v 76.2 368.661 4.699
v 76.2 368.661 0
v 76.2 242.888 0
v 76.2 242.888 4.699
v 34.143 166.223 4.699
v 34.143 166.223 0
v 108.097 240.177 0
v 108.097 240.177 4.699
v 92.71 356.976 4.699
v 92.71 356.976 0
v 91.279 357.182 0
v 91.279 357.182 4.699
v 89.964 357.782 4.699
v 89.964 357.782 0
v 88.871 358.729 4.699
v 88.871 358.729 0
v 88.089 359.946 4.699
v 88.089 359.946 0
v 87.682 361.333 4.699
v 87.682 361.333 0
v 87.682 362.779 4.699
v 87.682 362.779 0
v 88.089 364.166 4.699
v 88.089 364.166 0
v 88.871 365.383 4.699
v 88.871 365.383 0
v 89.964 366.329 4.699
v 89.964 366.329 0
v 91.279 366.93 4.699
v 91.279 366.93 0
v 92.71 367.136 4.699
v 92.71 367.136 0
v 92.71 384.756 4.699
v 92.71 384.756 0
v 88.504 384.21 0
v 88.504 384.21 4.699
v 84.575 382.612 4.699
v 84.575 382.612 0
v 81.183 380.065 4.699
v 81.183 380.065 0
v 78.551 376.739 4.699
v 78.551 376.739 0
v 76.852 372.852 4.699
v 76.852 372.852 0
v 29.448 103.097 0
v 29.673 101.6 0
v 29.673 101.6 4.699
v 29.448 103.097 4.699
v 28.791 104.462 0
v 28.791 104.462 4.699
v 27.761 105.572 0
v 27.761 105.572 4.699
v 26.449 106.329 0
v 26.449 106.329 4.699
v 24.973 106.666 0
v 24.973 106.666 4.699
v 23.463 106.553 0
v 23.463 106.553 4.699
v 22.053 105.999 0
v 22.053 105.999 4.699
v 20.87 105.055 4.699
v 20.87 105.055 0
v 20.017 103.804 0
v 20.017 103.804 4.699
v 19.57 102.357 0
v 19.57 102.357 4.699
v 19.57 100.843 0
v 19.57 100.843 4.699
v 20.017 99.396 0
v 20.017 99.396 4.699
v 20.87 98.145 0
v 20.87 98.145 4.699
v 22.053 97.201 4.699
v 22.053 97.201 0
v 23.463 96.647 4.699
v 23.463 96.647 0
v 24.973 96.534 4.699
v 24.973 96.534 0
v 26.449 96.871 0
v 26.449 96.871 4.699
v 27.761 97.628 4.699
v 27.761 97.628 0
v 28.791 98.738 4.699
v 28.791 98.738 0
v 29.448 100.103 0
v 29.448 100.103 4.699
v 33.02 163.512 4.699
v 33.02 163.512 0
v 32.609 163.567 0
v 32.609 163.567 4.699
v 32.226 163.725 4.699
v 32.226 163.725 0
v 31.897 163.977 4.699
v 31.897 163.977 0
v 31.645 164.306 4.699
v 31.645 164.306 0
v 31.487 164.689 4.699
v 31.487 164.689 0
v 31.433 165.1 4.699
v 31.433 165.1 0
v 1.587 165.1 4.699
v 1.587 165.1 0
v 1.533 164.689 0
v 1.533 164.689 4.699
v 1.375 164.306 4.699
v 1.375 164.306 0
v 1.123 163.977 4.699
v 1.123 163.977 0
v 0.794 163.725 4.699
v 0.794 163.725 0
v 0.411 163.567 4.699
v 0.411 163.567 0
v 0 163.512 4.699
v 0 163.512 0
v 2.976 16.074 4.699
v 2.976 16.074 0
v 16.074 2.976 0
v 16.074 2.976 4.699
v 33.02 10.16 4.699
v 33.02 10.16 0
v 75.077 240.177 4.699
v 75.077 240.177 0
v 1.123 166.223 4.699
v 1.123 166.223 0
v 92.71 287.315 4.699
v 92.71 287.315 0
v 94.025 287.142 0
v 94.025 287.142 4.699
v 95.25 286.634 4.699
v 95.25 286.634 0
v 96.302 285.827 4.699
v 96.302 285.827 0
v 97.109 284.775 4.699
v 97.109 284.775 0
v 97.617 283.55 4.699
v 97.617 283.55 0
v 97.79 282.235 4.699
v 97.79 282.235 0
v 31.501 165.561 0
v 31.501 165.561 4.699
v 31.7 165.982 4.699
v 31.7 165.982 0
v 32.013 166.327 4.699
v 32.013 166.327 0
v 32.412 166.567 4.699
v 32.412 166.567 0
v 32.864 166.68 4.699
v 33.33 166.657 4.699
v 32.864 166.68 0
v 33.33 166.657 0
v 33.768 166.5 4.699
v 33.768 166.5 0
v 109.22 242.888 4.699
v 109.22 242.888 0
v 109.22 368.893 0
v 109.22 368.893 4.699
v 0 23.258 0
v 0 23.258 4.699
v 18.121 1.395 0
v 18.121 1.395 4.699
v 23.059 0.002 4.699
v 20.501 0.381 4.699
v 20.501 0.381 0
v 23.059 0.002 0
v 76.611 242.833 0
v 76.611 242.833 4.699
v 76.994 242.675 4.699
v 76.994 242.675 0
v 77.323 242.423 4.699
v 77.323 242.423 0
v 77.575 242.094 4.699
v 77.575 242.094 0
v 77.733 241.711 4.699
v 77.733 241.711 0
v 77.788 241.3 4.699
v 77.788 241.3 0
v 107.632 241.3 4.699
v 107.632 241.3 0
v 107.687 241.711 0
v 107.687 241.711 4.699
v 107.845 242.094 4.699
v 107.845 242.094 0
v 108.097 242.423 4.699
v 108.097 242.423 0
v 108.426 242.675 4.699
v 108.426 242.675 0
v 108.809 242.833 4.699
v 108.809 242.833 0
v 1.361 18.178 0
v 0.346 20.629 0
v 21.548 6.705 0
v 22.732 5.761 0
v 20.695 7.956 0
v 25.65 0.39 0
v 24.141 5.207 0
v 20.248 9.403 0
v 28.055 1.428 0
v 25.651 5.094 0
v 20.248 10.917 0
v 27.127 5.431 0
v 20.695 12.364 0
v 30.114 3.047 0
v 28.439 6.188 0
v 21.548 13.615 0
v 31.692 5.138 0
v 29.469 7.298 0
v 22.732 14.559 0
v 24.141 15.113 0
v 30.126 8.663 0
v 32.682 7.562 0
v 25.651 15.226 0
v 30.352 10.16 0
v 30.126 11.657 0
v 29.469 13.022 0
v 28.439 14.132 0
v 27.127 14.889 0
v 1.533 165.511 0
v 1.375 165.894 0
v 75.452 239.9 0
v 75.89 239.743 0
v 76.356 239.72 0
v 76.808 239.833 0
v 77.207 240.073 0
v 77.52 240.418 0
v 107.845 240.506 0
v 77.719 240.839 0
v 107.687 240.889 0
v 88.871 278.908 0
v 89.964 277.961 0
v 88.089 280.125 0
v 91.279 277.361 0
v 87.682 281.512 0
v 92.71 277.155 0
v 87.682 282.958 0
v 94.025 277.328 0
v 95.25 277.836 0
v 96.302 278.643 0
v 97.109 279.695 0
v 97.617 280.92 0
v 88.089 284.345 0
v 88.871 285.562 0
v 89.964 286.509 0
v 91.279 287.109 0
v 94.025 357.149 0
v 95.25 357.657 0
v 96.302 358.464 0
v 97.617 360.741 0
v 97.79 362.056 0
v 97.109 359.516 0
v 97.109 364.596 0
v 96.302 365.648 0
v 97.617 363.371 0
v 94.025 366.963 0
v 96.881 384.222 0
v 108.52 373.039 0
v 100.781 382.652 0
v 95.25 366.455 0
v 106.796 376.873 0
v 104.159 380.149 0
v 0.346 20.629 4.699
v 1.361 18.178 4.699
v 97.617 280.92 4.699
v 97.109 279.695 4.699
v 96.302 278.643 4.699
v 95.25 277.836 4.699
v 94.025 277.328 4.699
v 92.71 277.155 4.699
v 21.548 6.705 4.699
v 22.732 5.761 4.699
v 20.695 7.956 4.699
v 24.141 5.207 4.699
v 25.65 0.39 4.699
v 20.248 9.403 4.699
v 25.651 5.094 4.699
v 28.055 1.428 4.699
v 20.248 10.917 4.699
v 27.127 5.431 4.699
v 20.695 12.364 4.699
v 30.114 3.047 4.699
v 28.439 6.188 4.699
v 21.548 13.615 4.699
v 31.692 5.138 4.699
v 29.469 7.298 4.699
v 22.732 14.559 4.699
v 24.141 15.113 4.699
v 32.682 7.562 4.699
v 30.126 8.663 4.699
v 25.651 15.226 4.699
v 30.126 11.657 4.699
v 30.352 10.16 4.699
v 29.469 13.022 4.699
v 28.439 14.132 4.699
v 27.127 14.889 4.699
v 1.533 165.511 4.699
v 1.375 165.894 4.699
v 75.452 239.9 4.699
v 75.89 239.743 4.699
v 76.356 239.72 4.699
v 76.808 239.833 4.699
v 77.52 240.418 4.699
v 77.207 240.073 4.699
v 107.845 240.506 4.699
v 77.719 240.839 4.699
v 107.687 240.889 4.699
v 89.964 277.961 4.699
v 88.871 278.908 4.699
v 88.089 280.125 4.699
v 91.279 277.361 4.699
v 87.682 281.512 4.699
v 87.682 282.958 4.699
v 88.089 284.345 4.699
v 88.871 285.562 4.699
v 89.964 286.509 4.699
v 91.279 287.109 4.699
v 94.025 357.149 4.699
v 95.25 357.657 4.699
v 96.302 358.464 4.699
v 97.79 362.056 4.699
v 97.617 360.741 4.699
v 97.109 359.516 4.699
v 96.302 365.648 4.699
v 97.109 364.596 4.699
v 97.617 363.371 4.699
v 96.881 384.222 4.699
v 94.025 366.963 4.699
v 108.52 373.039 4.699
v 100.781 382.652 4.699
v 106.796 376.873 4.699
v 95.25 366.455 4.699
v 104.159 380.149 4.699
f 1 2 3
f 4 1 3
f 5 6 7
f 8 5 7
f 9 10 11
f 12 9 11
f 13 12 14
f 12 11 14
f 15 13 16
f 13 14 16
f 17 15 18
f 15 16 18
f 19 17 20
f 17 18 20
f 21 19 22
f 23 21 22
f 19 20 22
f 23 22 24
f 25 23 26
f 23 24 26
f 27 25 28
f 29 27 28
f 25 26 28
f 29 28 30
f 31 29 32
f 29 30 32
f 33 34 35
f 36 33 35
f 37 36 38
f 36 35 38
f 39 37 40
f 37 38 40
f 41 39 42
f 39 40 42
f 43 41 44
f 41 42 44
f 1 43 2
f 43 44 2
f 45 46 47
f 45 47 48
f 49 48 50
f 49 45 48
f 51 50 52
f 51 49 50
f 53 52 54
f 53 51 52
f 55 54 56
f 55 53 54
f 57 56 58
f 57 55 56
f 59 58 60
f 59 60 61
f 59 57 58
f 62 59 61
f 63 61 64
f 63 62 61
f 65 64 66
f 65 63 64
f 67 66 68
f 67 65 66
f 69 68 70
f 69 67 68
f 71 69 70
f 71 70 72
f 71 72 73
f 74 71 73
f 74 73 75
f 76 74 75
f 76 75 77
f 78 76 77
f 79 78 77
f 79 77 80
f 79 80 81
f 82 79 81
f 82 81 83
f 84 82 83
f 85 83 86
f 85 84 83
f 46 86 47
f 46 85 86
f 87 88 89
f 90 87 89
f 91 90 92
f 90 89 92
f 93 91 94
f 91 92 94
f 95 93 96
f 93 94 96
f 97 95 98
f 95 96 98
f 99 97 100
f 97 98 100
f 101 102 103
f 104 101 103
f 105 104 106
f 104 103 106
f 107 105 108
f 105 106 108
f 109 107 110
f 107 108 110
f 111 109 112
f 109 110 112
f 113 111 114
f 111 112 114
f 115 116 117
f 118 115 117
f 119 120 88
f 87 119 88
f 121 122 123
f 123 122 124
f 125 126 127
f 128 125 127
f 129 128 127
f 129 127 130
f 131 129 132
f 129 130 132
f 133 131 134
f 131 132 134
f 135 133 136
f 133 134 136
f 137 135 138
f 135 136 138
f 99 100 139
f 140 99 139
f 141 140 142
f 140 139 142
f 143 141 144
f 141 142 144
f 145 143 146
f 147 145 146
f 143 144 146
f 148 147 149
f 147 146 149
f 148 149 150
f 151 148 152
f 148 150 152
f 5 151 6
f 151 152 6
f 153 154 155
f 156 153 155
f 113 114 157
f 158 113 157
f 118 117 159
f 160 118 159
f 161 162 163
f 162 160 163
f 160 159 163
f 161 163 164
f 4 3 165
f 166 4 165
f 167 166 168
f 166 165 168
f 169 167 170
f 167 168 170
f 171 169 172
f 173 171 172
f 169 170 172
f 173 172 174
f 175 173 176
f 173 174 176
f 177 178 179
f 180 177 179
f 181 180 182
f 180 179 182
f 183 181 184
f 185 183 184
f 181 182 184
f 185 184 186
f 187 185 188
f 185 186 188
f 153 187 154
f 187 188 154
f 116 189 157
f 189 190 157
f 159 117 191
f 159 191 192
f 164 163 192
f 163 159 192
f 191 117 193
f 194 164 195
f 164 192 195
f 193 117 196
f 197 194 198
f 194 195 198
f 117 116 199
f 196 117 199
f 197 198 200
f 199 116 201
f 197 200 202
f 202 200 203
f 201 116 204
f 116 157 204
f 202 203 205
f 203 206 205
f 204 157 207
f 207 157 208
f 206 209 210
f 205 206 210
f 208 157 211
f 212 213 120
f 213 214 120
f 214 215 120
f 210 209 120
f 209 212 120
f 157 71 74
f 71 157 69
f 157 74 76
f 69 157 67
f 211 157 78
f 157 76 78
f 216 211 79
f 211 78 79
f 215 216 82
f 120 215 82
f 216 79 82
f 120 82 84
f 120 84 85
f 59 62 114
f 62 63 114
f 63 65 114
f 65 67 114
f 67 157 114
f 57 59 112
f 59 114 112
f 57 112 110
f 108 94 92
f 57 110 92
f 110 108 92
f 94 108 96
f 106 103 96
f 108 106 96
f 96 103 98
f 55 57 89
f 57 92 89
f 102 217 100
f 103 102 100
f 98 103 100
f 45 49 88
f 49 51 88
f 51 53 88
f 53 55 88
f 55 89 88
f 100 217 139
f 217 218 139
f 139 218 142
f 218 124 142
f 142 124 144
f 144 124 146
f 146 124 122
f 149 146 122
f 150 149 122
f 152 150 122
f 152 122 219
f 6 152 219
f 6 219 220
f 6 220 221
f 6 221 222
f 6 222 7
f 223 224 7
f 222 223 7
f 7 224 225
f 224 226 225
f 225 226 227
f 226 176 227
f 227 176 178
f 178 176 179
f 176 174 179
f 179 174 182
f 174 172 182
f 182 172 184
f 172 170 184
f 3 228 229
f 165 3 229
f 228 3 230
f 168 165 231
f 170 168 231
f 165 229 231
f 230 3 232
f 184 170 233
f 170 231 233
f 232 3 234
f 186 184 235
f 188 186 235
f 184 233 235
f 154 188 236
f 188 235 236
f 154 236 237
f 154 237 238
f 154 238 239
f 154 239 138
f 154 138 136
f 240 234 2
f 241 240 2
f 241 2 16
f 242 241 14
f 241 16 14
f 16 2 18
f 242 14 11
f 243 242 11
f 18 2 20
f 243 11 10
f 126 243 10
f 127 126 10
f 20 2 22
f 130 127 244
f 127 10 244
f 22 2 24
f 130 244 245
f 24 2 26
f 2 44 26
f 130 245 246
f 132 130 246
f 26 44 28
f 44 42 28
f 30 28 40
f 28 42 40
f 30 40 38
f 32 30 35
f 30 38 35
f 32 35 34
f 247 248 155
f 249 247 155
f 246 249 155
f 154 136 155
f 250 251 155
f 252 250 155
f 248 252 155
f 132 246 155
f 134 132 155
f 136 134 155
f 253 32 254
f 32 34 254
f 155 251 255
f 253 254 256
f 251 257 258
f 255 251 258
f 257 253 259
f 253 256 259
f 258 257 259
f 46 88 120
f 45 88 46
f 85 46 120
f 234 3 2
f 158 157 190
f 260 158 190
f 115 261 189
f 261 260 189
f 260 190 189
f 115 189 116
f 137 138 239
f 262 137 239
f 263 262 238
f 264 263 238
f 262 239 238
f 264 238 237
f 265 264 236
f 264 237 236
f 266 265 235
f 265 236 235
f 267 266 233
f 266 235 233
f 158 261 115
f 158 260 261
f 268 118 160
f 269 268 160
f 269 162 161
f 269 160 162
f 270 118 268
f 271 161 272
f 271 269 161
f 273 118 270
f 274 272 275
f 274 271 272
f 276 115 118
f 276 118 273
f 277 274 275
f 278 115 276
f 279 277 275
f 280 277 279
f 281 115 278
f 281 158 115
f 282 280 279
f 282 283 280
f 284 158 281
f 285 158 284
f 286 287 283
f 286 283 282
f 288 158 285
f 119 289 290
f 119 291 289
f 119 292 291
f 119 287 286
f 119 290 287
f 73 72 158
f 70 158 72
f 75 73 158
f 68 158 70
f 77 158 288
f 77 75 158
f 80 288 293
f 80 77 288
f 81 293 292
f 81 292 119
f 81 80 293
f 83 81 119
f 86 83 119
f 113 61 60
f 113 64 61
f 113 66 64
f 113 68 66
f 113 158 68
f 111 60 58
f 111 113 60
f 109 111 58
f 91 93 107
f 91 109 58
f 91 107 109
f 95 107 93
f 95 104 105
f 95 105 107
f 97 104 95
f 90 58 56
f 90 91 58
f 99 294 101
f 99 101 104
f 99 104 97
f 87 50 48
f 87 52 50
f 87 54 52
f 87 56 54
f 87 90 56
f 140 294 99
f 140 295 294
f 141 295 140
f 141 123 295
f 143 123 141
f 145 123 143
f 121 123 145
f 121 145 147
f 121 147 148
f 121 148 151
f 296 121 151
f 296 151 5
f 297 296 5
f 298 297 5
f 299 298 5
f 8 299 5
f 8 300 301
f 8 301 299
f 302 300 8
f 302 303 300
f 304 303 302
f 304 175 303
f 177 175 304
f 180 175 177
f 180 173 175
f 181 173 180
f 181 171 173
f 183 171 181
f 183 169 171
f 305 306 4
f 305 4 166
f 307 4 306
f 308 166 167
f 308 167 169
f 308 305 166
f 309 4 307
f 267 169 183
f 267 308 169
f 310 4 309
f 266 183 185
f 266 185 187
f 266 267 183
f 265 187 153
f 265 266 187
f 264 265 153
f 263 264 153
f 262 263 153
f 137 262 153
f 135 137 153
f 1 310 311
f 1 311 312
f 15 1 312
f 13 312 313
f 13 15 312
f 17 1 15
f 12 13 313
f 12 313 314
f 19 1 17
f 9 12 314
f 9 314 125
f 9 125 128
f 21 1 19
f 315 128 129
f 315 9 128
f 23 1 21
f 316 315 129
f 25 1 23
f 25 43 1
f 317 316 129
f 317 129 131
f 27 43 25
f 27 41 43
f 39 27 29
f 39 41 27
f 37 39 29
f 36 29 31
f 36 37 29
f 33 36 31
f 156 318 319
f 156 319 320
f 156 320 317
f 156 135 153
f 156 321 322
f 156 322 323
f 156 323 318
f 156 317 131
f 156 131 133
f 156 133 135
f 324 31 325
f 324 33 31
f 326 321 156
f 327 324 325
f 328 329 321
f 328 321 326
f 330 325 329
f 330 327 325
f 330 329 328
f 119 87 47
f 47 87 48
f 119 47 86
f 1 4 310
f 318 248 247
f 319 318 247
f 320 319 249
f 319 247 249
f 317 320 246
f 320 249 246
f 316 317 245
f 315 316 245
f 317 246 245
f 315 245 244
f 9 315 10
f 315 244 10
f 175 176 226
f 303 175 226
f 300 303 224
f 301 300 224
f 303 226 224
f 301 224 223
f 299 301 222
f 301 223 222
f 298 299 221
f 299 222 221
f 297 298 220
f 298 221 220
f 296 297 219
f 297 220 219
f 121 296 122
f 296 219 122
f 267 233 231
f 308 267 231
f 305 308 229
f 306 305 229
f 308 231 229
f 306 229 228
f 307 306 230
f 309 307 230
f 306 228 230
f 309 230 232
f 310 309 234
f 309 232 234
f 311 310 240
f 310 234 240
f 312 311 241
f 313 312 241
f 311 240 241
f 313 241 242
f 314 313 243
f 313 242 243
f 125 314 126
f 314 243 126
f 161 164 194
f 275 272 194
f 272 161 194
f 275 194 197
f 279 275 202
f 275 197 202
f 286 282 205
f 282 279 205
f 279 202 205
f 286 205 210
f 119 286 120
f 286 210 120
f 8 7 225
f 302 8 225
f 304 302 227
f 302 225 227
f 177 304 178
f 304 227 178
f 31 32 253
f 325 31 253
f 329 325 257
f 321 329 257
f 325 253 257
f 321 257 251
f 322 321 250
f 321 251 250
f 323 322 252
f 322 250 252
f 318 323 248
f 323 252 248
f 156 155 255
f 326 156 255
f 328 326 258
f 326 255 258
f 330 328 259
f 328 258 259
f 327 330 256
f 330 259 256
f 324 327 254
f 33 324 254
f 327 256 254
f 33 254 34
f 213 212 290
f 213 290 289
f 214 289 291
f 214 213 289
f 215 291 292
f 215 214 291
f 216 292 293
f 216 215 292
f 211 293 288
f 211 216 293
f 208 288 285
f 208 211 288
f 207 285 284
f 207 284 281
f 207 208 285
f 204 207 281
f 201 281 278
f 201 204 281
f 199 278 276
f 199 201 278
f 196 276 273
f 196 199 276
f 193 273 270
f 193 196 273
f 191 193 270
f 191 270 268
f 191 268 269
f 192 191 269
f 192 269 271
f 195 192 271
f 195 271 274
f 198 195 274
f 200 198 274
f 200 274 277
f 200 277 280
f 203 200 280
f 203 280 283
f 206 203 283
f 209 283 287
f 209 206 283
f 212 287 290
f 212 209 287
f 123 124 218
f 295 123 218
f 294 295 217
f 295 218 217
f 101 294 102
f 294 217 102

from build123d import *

# Parameters (mm, degrees)
F0_R        = 5.08
F1_DEPTH    = 4.699
F2_T1_DEPTH = 25.7410489686
F2_T3_DEPTH = 55.499


# Not quite as in the source:
# - a fillet or chamfer that OpenCascade refuses, or shapes differently, is made with other operations: its cross-section is extruded or revolved along the edge and cut away or added


with BuildPart() as f1:
    # F0 (on Top) → F1 (new body)
    with BuildSketch(Plane.XY):
        with BuildLine():
            Line((31.4325, 165.1), (1.5875, 165.1))
            ThreePointArc((1.5875, 165.1), (1.1225320151, 163.9774679849), (0, 163.5125))
            Line((0, 163.5125), (0, 19.05))
            Line((0, 19.05), (19.05, 0))
            Line((19.05, 0), (33.02, 0))
            Line((33.02, 0), (33.02, 163.5125))
            ThreePointArc((33.02, 163.5125), (31.8974679849, 163.9774679849), (31.4325, 165.1))
        make_face()
        with Locations((25.2715107054, 10.16)):
            Circle(F0_R, mode=Mode.SUBTRACT)
        with Locations((24.5934482664, 101.6)):
            Circle(F0_R, mode=Mode.SUBTRACT)
        with BuildLine():
            Line((76.2, 368.6610758305), (76.2, 242.8875))
            ThreePointArc((76.2, 242.8875), (77.3225320151, 242.4225320151), (77.7875, 241.3))
            Line((77.7875, 241.3), (92.71, 241.3))
            Line((92.71, 241.3), (92.71, 277.1550263596))
            ThreePointArc((92.71, 277.1550263596), (87.63, 282.2350263596), (92.71, 287.3150263596))
            Line((92.71, 287.3150263596), (92.71, 356.975927515))
            ThreePointArc((92.71, 356.975927515), (87.63, 362.055927515), (92.71, 367.135927515))
            Line((92.71, 367.135927515), (92.71, 384.755953431))
            ThreePointArc((92.71, 384.755953431), (81.1825763095, 380.0653413474), (76.2, 368.6610758305))
        make_face()
        with BuildLine():
            Line((92.71, 277.1550263596), (92.71, 241.3))
            Line((92.71, 241.3), (107.6325, 241.3))
            ThreePointArc((107.6325, 241.3), (108.0974679849, 242.4225320151), (109.22, 242.8875))
            Line((109.22, 242.8875), (109.22, 368.8926994801))
            ThreePointArc((109.22, 368.8926994801), (104.1590146553, 380.148561327), (92.71, 384.755953431))
            Line((92.71, 384.755953431), (92.71, 367.135927515))
            ThreePointArc((92.71, 367.135927515), (96.3021024484, 365.6480299635), (97.79, 362.055927515))
            ThreePointArc((97.79, 362.055927515), (96.3021024484, 358.4638250666), (92.71, 356.975927515))
            Line((92.71, 356.975927515), (92.71, 287.3150263596))
            ThreePointArc((92.71, 287.3150263596), (96.3021024484, 285.827128808), (97.79, 282.2350263596))
            ThreePointArc((97.79, 282.2350263596), (96.3021024484, 278.6429239111), (92.71, 277.1550263596))
        make_face()
        with BuildLine():
            ThreePointArc((1.1225320151, 166.2225320151), (1.4666587579, 165.7075099489), (1.5875, 165.1))
            Line((1.5875, 165.1), (31.4325, 165.1))
            ThreePointArc((31.4325, 165.1), (32.4124900511, 166.5666587579), (34.1425320151, 166.2225320151))
            Line((34.1425320151, 166.2225320151), (108.0974679849, 240.1774679849))
            ThreePointArc((108.0974679849, 240.1774679849), (107.7533412421, 240.6924900511), (107.6325, 241.3))
            Line((107.6325, 241.3), (92.71, 241.3))
            Line((92.71, 241.3), (77.7875, 241.3))
            ThreePointArc((77.7875, 241.3), (76.8075099489, 239.8333412421), (75.0774679849, 240.1774679849))
            Line((75.0774679849, 240.1774679849), (1.1225320151, 166.2225320151))
        make_face()
    extrude(amount=F1_DEPTH)

    # F2: fillet of radius 10.16 on 3 edges, made by hand

    # F2_s2 → F2_t1 (cut)
    with BuildSketch(Plane.XY.offset(-10.5210244843)):
        with BuildLine():
            ThreePointArc((0, 23.2584097937), (0.7733839497, 19.3703461209), (2.9757951031, 16.0742048969))
            Line((2.9757951031, 16.0742048969), (0, 19.05))
            Line((0, 19.05), (0, 23.2584097937))
        make_face()
        with BuildLine():
            ThreePointArc((16.0742048969, 2.9757951031), (19.3703461209, 0.7733839497), (23.2584097937, 0))
            Line((23.2584097937, 0), (19.05, 0))
            Line((19.05, 0), (16.0742048969, 2.9757951031))
        make_face()
    extrude(amount=F2_T1_DEPTH, mode=Mode.SUBTRACT)

    # F2_s4 → F2_t3 (cut)
    with BuildSketch(Plane.XY.offset(-25.4)):
        with BuildLine():
            ThreePointArc((22.86, 0), (30.0442048969, 2.9757951031), (33.02, 10.16))
            Line((33.02, 10.16), (33.02, 0))
            Line((33.02, 0), (22.86, 0))
        make_face()
    extrude(amount=F2_T3_DEPTH, mode=Mode.SUBTRACT)


solid = f1.part
